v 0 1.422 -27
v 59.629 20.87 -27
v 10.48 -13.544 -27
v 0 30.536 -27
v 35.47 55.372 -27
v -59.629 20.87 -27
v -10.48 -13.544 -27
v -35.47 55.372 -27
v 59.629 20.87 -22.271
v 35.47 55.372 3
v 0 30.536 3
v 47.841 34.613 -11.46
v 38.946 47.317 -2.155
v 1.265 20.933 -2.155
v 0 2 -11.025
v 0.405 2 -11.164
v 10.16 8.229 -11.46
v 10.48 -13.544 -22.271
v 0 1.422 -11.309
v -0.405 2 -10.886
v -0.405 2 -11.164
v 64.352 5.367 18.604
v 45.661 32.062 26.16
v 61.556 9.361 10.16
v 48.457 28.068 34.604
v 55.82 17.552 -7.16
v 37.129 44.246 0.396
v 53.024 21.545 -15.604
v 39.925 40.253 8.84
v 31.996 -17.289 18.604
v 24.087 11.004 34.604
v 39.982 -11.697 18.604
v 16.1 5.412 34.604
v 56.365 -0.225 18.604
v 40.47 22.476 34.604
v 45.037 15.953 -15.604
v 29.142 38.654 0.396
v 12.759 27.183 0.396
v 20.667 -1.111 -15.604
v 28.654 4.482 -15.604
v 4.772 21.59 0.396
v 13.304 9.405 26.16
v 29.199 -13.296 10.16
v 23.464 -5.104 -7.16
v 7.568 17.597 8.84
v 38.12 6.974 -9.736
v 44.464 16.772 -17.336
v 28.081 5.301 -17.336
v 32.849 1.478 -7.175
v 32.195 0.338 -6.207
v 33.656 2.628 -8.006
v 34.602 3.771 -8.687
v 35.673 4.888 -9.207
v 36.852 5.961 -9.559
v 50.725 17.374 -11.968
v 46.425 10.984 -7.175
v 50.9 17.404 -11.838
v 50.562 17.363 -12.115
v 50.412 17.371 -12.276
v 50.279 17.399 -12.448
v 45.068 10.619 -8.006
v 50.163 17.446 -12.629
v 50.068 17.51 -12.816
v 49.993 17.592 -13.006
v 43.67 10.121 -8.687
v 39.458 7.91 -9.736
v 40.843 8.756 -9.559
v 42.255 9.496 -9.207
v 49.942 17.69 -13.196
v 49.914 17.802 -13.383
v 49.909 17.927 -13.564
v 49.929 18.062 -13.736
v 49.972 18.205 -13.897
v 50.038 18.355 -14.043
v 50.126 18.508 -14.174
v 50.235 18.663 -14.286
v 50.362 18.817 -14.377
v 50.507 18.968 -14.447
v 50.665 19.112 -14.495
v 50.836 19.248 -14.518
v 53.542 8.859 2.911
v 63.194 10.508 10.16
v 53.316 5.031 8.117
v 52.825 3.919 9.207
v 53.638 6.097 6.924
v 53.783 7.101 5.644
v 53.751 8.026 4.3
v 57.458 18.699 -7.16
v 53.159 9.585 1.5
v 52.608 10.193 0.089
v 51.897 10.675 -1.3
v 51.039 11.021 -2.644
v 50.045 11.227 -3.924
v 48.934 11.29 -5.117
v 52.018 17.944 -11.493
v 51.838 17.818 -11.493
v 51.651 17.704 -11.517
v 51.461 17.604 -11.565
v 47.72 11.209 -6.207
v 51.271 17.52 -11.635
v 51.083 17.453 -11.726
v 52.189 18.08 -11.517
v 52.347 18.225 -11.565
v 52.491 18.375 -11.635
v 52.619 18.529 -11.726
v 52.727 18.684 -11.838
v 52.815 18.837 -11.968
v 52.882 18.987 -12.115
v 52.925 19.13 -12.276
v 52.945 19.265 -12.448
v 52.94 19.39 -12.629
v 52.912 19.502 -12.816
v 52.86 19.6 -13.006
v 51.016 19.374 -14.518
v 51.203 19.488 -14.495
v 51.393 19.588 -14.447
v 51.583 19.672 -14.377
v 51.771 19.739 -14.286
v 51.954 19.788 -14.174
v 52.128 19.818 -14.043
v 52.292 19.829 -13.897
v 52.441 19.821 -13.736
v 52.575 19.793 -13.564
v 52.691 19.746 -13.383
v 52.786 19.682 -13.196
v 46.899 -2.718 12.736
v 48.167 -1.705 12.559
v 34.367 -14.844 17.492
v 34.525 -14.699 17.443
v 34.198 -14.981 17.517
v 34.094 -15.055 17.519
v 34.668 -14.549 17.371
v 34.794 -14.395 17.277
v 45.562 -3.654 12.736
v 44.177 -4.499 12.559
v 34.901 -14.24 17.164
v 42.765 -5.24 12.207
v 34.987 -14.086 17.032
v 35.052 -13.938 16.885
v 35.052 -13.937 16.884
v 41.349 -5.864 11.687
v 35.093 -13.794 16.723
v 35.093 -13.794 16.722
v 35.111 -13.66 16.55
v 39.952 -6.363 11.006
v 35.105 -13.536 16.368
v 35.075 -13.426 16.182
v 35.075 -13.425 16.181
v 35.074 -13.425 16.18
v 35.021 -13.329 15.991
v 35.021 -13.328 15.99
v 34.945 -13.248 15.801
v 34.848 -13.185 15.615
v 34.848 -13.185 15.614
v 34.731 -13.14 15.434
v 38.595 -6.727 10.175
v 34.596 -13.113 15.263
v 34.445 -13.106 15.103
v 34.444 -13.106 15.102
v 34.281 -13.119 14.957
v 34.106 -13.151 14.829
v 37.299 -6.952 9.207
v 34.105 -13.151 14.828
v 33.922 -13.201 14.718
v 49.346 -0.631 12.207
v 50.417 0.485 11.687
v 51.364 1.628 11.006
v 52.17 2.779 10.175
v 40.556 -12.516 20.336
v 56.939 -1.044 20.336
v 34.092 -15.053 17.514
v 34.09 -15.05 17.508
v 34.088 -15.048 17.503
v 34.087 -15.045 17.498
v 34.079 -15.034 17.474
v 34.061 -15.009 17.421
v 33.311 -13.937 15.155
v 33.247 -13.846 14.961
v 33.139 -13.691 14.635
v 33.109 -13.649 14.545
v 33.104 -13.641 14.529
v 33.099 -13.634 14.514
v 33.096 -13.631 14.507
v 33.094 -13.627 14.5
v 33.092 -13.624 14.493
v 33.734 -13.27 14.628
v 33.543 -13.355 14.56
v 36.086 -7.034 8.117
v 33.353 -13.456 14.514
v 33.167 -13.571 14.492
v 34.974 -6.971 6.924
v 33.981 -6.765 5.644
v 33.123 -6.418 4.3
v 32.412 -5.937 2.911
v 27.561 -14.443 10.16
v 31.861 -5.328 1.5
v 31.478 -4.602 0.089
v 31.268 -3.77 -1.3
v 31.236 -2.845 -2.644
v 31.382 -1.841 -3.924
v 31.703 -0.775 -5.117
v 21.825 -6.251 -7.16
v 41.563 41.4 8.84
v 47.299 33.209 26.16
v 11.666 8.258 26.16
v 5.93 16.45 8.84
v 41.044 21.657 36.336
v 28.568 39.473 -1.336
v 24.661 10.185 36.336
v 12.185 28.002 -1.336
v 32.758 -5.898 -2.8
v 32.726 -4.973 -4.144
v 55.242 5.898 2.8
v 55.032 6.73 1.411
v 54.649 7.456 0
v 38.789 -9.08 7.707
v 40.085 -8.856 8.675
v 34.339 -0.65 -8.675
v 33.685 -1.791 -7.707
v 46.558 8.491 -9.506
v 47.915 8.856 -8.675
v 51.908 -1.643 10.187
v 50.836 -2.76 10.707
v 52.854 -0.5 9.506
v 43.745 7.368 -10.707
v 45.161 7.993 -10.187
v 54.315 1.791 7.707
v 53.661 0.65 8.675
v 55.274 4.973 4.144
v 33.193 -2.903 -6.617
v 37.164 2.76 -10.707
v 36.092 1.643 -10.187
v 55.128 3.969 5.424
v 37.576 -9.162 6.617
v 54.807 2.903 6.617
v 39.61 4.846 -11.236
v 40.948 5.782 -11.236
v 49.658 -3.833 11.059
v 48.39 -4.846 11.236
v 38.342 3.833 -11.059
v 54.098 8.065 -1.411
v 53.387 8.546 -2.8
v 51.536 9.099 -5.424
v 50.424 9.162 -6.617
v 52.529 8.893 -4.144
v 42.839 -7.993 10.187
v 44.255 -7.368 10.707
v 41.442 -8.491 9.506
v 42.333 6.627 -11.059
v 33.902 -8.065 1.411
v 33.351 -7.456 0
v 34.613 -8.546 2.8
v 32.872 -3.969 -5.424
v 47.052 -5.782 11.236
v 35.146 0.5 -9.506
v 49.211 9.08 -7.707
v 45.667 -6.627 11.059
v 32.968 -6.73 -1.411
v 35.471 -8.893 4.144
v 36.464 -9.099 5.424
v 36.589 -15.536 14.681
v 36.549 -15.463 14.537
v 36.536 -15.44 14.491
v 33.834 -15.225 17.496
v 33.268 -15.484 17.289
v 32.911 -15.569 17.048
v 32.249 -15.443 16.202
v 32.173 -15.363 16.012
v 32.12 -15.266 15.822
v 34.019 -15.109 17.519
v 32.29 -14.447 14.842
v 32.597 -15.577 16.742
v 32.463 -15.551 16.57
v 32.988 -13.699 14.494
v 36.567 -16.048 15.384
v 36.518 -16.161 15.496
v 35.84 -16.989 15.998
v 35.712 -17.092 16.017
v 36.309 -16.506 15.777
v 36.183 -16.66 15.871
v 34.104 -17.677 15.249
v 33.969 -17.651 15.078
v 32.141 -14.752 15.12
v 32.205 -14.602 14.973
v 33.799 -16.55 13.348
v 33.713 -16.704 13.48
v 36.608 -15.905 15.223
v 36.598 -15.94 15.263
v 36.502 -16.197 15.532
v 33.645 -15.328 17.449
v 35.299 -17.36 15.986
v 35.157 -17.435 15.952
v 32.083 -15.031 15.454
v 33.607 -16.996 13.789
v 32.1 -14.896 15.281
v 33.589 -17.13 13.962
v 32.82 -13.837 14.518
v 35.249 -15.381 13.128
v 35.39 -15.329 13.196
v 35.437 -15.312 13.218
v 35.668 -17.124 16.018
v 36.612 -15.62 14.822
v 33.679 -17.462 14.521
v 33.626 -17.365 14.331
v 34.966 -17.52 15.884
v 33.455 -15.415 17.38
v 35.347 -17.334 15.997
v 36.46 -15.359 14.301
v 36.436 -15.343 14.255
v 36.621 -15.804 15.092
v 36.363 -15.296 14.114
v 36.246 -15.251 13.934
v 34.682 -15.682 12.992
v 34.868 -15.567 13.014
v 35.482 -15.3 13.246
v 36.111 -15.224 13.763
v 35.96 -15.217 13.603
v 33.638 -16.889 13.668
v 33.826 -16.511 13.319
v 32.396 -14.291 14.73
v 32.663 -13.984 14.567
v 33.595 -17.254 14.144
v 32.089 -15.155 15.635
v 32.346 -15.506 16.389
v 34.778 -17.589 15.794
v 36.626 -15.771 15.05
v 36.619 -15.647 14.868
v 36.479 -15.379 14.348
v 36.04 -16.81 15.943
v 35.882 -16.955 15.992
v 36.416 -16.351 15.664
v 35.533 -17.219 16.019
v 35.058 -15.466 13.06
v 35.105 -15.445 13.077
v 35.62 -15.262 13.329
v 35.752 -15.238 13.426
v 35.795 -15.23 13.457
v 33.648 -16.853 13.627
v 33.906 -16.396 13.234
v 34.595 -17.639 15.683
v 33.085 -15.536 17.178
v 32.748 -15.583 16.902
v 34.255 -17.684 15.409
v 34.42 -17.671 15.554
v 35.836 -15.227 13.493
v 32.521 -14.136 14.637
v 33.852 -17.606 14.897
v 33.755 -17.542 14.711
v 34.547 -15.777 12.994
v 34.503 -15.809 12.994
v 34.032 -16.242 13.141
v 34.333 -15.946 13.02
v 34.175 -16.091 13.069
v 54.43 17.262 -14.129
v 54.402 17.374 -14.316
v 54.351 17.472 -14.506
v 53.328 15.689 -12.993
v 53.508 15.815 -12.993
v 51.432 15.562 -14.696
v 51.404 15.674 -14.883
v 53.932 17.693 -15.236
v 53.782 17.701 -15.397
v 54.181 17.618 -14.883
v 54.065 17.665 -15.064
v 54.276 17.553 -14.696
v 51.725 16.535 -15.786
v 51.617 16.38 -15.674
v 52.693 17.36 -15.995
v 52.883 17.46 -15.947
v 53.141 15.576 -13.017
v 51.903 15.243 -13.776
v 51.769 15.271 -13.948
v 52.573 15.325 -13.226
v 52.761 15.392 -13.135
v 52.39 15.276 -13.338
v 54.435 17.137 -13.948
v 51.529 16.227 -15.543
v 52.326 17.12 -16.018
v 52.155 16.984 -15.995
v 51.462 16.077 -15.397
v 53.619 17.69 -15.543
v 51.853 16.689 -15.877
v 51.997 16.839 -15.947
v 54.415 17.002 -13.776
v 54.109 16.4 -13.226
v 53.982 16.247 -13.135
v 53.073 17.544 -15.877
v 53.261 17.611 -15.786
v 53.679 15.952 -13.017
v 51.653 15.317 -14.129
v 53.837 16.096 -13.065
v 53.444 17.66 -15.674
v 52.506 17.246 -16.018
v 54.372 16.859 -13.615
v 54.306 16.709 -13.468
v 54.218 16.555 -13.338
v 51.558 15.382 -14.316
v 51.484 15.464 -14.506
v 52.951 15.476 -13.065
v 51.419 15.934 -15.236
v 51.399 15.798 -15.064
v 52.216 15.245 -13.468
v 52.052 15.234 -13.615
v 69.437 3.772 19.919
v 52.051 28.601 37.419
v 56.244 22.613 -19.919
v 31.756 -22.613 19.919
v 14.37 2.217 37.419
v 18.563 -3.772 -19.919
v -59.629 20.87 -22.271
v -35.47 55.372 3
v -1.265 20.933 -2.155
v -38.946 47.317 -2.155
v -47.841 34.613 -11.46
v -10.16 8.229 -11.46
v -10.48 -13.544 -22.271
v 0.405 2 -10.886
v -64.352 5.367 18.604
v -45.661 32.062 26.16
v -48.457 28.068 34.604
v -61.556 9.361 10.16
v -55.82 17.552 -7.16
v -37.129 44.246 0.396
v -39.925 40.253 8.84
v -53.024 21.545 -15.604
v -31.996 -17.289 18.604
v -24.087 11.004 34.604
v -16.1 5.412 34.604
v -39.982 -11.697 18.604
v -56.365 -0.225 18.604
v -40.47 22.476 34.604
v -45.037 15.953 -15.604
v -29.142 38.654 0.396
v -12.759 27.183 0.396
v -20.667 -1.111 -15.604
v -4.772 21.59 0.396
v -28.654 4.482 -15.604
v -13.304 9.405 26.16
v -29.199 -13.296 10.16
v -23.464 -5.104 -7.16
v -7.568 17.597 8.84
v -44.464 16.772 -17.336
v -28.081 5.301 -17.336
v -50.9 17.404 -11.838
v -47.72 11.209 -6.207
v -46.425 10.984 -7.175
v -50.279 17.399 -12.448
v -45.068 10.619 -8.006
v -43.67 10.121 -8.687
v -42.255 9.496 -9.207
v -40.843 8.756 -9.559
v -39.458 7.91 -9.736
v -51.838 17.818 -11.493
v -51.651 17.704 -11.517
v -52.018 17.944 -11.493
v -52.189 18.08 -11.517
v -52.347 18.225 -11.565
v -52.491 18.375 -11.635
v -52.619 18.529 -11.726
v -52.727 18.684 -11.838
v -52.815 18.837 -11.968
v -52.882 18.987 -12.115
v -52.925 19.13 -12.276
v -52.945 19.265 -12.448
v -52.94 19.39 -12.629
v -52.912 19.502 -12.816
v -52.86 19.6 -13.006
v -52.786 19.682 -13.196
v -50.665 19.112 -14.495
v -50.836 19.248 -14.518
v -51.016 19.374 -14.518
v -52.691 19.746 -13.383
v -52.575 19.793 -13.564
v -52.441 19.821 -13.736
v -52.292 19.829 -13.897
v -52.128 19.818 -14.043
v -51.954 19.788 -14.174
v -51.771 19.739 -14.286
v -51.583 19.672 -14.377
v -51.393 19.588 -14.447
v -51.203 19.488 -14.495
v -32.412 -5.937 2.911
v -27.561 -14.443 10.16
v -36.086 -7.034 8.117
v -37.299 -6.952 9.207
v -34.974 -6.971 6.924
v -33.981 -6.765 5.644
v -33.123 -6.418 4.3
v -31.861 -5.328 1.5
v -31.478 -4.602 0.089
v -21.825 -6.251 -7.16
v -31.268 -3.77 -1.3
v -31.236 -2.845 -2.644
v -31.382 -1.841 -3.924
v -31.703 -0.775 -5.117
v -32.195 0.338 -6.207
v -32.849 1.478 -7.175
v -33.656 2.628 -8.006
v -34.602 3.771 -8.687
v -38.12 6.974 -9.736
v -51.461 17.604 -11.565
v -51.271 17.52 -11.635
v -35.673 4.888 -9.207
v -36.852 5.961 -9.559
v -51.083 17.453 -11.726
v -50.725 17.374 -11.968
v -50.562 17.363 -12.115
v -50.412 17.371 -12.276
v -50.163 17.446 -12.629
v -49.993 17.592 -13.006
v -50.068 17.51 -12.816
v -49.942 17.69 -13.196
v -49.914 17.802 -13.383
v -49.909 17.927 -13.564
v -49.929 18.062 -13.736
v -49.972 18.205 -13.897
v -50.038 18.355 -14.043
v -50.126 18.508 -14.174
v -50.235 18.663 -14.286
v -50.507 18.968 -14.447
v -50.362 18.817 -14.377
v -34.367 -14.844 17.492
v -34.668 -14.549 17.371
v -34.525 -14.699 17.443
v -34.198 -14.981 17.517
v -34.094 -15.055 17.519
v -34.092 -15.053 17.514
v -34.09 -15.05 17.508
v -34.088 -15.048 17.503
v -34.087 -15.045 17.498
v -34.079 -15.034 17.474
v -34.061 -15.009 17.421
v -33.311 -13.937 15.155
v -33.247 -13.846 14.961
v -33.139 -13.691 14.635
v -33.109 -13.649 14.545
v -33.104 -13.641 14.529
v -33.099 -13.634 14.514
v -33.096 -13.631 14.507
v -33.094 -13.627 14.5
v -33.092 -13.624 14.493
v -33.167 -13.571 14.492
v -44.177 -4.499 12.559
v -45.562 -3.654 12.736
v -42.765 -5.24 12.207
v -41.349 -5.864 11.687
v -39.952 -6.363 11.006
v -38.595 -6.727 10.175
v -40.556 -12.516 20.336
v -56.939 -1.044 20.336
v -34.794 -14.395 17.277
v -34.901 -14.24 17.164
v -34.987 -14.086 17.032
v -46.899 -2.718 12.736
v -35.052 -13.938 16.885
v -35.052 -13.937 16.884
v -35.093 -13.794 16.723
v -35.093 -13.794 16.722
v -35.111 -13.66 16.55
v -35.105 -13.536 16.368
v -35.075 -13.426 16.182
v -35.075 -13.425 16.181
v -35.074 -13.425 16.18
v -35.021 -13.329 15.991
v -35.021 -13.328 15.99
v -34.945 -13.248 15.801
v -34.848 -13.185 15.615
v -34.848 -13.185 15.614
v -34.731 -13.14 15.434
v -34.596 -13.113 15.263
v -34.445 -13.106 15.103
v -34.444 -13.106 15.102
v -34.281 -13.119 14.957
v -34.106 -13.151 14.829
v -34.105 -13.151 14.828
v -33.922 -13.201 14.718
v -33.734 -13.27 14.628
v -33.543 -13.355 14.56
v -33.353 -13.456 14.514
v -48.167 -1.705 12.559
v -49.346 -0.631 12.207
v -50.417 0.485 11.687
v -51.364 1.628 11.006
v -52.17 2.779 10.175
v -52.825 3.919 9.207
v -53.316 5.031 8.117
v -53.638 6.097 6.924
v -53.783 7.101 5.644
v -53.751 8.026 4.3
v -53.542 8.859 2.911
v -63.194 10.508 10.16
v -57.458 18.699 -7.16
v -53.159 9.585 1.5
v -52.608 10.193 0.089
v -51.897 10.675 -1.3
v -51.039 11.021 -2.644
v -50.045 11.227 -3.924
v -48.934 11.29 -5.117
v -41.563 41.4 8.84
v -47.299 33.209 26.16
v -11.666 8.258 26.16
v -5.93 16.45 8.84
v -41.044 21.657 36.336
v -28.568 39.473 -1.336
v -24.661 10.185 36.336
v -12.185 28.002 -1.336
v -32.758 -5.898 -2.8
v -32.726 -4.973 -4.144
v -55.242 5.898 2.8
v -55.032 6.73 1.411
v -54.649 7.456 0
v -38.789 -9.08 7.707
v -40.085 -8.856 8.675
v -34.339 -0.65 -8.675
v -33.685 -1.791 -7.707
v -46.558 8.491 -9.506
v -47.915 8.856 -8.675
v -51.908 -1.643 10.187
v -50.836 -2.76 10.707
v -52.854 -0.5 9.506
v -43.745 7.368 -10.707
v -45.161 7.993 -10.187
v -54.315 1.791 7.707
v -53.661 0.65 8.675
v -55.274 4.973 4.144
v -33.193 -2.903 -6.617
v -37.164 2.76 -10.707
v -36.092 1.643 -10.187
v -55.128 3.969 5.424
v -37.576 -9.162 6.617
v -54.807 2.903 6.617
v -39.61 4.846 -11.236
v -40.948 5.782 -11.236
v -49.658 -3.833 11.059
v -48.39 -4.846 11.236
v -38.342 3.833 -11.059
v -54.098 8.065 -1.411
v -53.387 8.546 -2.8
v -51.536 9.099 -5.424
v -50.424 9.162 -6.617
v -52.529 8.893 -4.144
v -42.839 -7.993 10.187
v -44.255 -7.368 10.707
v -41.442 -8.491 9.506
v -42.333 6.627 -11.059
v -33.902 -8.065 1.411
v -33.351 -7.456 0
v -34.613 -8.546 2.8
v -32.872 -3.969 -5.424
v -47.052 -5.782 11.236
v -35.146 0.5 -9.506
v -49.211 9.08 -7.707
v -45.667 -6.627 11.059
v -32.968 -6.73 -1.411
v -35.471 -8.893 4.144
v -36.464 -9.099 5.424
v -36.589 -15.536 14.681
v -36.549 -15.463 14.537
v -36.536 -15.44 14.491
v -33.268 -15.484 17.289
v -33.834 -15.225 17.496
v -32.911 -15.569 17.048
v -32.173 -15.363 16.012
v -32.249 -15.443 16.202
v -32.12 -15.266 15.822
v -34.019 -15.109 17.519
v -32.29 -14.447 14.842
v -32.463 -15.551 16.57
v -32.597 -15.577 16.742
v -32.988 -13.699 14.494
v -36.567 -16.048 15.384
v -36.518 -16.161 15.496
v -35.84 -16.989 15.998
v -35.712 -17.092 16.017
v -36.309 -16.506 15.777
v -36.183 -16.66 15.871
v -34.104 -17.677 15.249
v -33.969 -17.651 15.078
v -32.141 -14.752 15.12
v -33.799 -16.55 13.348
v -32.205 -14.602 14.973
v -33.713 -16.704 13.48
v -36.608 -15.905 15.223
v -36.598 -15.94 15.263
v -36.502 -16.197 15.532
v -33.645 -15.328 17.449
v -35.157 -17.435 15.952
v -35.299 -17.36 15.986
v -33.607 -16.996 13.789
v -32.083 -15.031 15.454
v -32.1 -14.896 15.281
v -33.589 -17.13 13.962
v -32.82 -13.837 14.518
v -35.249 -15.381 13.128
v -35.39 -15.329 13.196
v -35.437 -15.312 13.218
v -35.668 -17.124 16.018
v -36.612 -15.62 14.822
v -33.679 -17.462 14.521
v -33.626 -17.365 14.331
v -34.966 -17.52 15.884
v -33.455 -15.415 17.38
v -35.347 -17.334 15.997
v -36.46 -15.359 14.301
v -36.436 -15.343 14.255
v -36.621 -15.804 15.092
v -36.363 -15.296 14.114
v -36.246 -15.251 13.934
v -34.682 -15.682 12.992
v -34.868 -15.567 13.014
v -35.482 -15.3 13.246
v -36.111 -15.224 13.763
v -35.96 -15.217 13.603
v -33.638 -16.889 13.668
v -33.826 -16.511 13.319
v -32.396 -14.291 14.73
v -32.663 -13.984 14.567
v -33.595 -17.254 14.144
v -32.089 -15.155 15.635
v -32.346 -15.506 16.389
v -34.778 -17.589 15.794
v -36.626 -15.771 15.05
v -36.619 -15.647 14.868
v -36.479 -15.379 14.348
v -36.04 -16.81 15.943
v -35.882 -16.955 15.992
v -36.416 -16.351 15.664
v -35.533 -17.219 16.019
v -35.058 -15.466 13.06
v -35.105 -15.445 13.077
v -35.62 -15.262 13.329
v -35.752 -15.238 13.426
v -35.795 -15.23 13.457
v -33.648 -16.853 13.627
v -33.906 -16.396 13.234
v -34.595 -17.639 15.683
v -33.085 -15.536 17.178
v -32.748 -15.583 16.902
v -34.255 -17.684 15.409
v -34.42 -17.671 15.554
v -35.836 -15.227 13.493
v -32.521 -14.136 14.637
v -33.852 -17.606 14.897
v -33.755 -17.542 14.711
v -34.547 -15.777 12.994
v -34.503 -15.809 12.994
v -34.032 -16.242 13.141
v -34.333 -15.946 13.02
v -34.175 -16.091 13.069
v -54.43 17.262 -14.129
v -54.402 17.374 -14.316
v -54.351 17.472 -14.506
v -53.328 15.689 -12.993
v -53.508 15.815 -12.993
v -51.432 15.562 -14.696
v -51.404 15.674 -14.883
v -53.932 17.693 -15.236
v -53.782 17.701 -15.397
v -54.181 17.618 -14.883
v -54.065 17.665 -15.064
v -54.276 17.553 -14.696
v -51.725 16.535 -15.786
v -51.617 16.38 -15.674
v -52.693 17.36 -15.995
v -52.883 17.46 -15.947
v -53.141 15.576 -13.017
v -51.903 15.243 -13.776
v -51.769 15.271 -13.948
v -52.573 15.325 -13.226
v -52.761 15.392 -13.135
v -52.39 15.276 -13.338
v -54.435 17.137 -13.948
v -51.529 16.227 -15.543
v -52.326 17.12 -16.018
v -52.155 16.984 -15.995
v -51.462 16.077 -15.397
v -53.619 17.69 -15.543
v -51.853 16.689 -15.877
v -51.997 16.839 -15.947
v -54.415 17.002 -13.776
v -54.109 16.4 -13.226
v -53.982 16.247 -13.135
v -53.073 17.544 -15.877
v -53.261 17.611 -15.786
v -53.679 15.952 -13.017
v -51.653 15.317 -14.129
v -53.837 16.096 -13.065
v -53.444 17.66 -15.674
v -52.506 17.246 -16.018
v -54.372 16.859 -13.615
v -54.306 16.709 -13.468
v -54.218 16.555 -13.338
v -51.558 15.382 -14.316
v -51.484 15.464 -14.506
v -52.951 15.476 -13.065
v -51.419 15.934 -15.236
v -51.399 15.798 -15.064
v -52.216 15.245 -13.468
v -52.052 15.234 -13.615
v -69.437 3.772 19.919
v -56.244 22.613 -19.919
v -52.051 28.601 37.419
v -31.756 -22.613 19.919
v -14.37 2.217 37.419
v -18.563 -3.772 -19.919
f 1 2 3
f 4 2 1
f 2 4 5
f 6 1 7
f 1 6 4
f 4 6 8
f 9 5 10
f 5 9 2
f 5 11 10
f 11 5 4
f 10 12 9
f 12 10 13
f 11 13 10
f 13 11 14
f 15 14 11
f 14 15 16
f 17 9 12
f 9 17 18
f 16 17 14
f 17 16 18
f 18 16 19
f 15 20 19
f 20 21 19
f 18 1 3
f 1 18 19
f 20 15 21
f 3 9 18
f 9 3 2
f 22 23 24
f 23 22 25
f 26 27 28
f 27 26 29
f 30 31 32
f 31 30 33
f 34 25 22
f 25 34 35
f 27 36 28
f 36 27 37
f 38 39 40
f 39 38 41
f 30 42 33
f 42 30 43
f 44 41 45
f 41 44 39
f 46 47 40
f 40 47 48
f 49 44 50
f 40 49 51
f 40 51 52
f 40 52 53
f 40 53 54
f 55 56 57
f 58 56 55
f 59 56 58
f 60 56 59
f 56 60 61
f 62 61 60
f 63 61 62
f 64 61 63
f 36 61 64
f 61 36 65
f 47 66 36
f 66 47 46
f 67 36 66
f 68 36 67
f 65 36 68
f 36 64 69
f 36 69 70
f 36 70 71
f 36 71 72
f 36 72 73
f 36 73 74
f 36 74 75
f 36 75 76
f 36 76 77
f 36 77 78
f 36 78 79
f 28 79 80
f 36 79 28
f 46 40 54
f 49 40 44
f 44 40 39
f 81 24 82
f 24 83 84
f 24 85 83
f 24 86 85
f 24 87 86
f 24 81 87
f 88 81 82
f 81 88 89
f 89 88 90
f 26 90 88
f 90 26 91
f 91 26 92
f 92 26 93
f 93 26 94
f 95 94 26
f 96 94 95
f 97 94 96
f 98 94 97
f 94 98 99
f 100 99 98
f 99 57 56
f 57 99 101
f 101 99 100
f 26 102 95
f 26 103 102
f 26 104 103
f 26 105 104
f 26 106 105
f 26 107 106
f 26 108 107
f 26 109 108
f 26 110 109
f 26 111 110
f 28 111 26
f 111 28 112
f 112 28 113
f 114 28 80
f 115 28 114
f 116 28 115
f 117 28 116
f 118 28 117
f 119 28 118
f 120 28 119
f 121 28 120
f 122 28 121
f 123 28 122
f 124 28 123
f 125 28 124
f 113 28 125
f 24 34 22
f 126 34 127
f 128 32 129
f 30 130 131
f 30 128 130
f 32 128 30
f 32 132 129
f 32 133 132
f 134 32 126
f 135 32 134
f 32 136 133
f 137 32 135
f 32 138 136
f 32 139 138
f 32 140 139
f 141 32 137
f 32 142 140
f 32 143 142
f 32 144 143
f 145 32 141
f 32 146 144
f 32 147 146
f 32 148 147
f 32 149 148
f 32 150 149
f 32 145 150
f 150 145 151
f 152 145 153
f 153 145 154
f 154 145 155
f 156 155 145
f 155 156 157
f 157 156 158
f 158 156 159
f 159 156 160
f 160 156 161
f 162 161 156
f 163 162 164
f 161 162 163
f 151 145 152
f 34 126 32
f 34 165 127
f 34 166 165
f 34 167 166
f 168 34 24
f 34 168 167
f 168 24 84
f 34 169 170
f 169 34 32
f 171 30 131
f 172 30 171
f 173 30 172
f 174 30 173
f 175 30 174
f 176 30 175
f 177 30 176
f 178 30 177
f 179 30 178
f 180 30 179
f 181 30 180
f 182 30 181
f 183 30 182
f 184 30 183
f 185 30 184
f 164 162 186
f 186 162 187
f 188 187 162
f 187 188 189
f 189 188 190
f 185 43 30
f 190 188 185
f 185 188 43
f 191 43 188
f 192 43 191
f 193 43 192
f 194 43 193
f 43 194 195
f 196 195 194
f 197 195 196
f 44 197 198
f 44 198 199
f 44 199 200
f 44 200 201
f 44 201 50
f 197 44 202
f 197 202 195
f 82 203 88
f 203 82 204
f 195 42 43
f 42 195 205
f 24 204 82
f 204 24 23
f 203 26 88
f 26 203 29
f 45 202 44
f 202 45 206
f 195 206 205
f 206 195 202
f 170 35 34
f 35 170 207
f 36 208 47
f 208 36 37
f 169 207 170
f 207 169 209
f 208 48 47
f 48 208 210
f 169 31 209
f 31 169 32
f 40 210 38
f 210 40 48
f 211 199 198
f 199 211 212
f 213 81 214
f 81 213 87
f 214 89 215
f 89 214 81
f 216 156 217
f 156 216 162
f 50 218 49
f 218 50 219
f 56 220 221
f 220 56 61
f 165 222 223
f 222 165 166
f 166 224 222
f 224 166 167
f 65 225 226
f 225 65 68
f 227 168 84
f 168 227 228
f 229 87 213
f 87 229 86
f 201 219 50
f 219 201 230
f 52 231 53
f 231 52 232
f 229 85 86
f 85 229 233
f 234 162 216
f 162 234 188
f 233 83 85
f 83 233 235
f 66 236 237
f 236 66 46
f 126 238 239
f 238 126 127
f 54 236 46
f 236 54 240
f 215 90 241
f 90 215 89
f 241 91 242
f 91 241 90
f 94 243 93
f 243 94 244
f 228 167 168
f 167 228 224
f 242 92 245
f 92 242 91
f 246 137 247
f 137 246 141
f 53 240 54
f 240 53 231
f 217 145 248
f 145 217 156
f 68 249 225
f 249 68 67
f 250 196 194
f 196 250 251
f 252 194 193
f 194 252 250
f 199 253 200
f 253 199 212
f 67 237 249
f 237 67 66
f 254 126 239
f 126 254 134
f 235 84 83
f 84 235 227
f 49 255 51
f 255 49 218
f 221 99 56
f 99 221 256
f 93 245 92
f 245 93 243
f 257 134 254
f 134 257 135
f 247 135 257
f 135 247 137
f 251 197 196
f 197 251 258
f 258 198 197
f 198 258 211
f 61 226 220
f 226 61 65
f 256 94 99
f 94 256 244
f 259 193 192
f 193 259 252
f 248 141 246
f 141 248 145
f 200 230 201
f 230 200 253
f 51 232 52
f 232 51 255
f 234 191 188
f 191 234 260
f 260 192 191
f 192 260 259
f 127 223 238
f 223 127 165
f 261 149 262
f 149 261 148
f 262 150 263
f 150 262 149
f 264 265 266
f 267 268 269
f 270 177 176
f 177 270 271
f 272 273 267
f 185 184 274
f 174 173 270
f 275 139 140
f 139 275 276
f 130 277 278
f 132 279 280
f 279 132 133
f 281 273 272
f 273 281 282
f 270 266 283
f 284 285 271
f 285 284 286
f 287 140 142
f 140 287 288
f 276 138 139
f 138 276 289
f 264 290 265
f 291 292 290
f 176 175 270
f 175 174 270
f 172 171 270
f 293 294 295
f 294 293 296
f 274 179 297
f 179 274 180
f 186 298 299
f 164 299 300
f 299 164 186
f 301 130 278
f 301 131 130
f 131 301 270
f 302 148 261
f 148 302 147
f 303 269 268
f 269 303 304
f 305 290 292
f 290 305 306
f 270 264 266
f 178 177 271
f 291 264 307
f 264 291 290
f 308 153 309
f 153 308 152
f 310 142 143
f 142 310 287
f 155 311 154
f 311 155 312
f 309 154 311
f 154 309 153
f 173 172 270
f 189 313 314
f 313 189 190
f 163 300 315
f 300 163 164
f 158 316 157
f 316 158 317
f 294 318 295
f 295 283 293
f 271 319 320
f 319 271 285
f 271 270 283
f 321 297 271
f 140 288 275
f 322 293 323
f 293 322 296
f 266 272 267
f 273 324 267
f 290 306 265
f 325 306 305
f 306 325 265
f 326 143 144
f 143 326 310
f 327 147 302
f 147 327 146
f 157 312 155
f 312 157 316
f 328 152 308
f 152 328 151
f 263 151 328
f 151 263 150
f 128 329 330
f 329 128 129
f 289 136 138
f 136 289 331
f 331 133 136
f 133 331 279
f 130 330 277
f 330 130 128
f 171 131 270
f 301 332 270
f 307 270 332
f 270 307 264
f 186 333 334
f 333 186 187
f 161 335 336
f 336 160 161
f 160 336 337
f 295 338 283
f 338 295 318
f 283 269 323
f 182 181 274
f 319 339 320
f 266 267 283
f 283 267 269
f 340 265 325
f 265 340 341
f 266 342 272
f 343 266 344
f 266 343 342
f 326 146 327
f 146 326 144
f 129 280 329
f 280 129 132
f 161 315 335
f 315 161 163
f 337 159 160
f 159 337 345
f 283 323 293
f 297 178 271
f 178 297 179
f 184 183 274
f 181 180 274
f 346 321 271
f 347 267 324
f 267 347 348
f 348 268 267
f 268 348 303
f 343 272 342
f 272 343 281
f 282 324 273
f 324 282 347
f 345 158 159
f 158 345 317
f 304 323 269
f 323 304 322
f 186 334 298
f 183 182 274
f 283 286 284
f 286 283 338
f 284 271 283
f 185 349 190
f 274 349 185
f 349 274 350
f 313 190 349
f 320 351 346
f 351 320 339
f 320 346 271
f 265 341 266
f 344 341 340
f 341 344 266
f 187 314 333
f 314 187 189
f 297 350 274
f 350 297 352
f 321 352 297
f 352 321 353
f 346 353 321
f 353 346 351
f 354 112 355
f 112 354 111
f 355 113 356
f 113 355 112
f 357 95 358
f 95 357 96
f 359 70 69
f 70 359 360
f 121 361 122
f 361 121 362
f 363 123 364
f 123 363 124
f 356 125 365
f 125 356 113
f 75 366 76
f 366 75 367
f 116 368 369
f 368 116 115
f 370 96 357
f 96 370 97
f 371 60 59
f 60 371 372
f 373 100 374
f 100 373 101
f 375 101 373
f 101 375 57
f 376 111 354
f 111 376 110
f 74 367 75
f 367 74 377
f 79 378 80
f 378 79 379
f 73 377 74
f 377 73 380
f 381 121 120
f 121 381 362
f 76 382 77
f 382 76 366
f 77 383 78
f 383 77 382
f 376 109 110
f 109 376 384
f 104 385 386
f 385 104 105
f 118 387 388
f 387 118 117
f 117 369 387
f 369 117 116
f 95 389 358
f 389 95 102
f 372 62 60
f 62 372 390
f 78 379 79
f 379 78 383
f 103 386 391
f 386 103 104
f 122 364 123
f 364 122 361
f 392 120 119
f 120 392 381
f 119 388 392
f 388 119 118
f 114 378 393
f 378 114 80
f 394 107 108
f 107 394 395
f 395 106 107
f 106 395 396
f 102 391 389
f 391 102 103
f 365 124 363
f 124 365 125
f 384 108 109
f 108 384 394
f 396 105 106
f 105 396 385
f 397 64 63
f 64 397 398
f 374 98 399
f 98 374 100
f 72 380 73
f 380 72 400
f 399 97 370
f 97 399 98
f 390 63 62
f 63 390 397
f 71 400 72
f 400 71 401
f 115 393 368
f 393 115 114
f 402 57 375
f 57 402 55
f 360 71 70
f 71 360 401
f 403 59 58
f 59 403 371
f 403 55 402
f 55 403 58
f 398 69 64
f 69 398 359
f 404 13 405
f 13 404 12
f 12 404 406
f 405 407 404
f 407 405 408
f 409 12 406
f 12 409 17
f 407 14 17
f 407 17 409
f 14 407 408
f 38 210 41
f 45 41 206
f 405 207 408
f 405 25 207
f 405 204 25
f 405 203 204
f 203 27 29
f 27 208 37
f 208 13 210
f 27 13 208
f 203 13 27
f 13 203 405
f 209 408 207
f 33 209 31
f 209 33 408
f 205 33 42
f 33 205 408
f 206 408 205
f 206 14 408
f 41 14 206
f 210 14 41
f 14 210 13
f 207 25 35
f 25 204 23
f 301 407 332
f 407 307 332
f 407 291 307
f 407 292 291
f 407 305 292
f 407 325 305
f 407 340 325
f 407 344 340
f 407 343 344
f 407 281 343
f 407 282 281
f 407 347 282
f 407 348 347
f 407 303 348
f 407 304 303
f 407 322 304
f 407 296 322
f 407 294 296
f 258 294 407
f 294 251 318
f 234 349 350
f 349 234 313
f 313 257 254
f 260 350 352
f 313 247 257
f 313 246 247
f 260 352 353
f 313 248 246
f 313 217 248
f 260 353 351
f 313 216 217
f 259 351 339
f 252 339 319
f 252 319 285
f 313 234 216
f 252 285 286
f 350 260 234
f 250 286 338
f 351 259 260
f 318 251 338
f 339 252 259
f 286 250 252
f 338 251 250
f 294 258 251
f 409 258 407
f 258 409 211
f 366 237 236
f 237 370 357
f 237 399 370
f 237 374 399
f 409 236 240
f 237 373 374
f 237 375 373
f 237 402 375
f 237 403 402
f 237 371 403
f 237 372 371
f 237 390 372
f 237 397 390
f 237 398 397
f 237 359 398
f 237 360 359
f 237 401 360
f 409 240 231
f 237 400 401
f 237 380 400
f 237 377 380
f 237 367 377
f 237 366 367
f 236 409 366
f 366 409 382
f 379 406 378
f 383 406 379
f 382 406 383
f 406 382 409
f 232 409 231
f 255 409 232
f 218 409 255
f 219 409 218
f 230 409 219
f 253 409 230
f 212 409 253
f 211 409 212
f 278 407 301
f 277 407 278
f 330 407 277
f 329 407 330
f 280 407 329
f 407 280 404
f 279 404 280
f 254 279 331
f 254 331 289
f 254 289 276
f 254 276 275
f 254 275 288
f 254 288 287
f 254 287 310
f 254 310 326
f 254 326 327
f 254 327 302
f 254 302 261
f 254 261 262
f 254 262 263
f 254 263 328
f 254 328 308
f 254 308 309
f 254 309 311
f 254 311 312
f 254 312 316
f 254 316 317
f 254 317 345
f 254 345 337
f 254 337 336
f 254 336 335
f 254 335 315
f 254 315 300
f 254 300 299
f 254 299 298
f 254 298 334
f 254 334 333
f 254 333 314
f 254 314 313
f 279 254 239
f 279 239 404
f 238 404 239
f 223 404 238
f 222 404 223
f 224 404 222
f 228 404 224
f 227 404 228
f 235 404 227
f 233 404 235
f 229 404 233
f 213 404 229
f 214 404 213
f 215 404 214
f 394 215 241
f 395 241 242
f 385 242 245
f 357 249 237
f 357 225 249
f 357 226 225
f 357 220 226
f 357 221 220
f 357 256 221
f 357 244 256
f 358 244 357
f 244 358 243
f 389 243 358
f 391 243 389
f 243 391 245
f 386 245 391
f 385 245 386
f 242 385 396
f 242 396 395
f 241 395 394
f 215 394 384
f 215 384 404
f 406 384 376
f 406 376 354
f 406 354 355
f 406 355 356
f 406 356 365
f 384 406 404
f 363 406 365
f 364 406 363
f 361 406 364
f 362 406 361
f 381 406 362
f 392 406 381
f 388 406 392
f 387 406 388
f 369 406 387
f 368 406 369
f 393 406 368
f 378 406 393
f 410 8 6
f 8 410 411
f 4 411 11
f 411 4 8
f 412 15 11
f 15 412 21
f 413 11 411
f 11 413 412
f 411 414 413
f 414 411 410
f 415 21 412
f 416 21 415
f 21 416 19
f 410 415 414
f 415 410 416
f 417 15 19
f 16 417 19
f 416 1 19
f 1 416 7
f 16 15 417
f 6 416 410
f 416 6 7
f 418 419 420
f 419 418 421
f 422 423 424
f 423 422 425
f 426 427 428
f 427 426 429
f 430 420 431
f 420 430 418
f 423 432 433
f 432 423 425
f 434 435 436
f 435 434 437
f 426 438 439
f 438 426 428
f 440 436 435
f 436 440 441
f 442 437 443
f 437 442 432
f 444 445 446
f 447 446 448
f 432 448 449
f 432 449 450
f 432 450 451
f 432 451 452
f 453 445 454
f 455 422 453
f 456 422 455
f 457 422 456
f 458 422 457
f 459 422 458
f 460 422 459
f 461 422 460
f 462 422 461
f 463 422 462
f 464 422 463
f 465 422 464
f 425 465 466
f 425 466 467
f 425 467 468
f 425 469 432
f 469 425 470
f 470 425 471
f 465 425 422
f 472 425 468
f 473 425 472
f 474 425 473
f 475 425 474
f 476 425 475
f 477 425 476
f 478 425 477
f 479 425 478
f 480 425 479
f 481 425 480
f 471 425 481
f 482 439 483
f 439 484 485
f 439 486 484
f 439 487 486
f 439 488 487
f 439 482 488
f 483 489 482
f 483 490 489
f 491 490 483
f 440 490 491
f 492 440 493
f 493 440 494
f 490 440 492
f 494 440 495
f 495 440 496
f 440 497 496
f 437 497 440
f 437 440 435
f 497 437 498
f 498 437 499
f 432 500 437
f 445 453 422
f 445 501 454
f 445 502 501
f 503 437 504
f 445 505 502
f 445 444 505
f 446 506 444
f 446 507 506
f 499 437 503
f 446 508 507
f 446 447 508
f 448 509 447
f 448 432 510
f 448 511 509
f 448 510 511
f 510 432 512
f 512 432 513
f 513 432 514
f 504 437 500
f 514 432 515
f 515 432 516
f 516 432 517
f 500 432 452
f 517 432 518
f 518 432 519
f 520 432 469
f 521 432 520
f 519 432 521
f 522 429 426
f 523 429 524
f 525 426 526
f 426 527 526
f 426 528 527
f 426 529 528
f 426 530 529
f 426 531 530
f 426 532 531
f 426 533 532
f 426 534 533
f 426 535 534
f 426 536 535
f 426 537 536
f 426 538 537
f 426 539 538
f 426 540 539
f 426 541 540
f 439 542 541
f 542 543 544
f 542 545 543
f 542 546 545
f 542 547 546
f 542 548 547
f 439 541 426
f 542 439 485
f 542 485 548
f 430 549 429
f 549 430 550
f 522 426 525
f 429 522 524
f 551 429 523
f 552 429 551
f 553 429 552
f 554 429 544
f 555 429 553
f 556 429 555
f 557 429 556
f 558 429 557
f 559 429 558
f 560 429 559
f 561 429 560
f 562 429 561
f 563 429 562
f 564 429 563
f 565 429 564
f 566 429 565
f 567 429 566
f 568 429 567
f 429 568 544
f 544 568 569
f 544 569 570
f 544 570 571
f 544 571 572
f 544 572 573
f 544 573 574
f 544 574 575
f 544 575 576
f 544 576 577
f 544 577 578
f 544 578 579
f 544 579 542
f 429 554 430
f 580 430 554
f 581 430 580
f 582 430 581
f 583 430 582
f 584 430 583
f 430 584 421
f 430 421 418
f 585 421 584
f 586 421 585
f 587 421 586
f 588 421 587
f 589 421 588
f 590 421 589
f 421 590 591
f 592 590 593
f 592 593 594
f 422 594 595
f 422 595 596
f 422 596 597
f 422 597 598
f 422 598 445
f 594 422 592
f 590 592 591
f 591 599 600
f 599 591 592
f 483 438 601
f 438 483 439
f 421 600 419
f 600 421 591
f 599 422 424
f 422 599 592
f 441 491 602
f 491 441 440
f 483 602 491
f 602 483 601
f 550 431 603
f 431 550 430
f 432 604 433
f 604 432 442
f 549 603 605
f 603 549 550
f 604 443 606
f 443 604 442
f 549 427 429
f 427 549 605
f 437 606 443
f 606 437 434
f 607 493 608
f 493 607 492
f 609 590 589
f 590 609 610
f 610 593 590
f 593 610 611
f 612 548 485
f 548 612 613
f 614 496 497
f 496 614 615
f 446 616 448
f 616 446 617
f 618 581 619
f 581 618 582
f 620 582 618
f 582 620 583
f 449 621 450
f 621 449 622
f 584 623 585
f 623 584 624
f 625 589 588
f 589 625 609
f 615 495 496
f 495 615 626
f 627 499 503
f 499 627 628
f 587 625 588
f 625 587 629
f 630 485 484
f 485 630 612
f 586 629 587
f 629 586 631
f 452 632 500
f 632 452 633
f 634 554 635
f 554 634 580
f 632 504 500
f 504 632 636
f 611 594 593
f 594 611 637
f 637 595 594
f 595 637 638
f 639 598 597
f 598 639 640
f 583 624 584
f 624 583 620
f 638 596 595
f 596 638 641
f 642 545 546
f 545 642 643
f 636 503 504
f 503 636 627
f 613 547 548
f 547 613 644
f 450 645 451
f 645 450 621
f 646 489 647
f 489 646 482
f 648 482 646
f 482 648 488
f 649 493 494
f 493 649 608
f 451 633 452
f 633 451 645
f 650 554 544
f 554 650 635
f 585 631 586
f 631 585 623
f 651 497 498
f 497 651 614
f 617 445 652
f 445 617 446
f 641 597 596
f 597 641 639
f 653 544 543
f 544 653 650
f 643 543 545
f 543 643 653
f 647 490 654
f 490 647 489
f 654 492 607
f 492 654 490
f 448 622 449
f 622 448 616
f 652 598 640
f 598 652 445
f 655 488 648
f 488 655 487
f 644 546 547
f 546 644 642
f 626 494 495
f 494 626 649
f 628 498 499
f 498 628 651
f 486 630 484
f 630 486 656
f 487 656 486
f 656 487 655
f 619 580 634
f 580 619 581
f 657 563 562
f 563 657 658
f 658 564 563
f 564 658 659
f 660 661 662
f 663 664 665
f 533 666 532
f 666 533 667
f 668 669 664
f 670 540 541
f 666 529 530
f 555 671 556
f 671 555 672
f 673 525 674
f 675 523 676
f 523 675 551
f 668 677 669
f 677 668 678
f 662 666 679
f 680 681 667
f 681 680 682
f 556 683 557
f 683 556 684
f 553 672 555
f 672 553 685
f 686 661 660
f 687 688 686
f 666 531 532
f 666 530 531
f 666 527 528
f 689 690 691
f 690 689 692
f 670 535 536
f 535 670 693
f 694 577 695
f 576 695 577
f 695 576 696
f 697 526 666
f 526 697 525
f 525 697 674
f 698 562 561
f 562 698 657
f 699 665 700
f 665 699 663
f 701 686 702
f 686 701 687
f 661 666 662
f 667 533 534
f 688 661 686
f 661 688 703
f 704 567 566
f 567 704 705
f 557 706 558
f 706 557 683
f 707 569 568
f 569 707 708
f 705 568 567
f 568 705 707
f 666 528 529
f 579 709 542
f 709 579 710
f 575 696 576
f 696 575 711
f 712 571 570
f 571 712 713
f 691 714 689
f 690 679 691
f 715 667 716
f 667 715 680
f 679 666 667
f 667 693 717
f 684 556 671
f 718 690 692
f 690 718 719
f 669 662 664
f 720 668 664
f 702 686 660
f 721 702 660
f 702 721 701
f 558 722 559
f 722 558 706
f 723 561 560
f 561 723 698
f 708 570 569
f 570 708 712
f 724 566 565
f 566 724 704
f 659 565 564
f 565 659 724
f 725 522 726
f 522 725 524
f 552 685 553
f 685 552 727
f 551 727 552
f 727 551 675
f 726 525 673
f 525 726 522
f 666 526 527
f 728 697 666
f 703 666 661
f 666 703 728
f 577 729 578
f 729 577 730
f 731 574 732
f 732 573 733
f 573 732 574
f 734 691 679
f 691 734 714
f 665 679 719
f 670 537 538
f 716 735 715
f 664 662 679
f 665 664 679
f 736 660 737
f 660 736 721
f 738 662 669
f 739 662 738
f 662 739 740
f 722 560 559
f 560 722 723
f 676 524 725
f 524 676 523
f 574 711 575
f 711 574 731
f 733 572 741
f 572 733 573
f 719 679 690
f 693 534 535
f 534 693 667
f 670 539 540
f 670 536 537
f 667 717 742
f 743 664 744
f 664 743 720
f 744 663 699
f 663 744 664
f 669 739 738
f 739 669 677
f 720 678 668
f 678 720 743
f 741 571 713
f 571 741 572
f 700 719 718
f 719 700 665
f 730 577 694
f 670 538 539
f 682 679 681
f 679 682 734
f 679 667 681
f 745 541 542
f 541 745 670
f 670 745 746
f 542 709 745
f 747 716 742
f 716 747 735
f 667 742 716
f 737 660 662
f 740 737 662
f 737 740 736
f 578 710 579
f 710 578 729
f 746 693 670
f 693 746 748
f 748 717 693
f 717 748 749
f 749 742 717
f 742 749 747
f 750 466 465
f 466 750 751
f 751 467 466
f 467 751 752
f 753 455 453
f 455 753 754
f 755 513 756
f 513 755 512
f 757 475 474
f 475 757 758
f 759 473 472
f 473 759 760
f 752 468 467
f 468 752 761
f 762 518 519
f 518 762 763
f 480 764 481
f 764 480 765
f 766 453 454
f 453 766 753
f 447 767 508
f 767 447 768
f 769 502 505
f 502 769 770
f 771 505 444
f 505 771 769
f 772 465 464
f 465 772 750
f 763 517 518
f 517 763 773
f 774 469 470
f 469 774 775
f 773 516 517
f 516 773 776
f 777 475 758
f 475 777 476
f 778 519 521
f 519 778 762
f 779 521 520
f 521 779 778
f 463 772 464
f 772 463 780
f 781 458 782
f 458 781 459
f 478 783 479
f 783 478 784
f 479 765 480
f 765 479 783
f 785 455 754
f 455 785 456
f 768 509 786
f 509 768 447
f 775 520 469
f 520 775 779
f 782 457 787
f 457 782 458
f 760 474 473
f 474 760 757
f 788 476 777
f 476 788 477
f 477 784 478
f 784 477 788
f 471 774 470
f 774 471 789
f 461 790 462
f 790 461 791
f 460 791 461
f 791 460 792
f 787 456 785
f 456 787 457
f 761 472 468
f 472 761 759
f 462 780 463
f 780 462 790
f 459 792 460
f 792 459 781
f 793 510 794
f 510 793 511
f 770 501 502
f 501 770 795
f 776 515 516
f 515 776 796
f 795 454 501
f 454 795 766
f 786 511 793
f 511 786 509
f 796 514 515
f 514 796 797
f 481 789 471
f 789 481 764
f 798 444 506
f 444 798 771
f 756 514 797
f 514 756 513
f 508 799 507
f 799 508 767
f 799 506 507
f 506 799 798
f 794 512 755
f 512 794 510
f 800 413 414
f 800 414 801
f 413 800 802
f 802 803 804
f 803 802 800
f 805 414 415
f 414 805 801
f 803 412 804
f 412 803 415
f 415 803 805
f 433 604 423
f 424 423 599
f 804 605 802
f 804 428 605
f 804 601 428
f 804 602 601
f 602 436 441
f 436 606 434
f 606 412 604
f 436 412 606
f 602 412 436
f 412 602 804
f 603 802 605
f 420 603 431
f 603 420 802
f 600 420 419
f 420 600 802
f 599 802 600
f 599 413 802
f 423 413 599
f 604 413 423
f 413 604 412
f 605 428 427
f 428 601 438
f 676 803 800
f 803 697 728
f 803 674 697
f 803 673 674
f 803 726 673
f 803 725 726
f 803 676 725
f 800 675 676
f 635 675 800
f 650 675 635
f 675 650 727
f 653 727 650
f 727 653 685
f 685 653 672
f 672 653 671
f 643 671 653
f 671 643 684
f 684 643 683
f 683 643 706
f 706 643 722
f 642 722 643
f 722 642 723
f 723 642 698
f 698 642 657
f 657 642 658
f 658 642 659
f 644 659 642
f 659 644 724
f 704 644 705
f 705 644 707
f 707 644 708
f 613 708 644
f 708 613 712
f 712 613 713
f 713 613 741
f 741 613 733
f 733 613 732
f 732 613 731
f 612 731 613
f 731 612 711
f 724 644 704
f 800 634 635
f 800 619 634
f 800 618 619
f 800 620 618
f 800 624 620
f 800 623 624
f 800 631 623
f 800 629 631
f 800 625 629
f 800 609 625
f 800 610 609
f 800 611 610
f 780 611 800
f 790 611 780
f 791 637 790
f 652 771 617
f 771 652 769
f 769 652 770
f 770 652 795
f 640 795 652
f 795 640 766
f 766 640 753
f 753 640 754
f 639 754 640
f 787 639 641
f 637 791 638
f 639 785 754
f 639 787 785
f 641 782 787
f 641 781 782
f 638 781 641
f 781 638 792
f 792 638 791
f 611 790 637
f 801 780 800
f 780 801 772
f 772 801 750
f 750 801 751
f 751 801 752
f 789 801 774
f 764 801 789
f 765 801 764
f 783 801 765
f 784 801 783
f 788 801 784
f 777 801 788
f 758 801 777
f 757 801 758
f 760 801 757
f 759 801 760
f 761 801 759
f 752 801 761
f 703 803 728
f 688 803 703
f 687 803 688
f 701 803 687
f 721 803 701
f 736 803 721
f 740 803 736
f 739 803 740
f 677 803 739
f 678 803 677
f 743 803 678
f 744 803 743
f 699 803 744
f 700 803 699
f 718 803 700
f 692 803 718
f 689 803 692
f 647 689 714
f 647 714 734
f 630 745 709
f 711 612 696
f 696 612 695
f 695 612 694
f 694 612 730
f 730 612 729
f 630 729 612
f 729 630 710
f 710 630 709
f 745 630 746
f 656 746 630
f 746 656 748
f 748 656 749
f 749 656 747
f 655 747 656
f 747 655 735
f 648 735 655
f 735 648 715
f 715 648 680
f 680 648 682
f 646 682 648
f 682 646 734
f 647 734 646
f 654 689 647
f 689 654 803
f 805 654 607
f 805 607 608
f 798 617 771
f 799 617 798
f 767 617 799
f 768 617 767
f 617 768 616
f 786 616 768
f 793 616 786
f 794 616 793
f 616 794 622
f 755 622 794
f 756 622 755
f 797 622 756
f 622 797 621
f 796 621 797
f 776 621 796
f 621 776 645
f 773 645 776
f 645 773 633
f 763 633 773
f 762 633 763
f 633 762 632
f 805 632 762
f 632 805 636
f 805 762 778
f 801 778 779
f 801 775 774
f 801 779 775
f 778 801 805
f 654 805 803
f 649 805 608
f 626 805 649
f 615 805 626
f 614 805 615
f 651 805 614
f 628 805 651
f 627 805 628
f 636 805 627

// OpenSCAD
resolution_factor = 1.00;

module prism(l, w, h)
{
    polyhedron(
               points=[[0,0,0], [l,0,0], [l,w,0], [0,w,0], [0,w,h], [l,w,h]],
               faces=[[0,1,2,3],[5,4,3,2],[0,4,5,1],[0,3,4],[5,2,1]]
               );    
}

module camera_cutout()
{
    width = 39.5;
    height = 39.5;
    length = 68;
    cable_well_depth = 4.0;
    cable_well_width= 20.0;
    
    //How much do we pull back 
    translate([0, 3, 0])
    
    union()
    {
        //Basic block of electronics
        translate([0, length/2, 0])
        cube([width, length, height], center = true);
        
        //Channel for cables between electronics
        translate([0, length/2.0, 0])
        cube([width+cable_well_depth, length, cable_well_width], center = true);
        translate([0, length/2.0, 0])
        cube([cable_well_width, length, height+cable_well_depth], center = true);
        
        //Lens hole
        translate([0, 0.01, 0])
        rotate(90, [1, 0, 0])
        cylinder(r = 13, h = 20, $fn = 50);
        
        //Screwholes
        zz = 33.5/2;
//        translate([zz, 0.01, zz])
//        rotate(90, [1, 0, 0])
//        cylinder(r = 3.5/2, h = 4, $fn = 50);
        translate([-zz, 0, zz])
        rotate(90, [1, 0.01, 0])
        cylinder(r = 3.5/2, h = 4, $fn = 50);
        translate([zz, 0.01, -zz])
        rotate(90, [1, 0, 0])
        cylinder(r = 3.5/2, h = 4, $fn = 50);
//       translate([-zz, 0.01, -zz])
//       rotate(90, [1, 0, 0])
//       cylinder(r = 3.5/2, h = 4, $fn = 50);
        
    }
}

module camera()
{
    width = 46;
    depth = 35.0;
    difference()
    {
        union()
        {
            translate([0, depth/2, 0])
            cube([width, depth, width], center = true);
        }
        camera_cutout();
    }
}


/*

color( "LightCoral", 1.0 ) {
    translate([-distV,0,0])
    rotate([dispV,0,-dispH])
    camera();
}
*/

//SUPPORT PRISMS


//DRAWING THE CAMERA BOXES
dispH = 35;
dispV = 30;
distV = 44;

$fn=100;


module sup(){

    difference(){
        difference(){
            color( "PaleGreen", 1.0 ) {
                translate([15, -20, -27])
                rotate([0,0,dispH])
                    prism(60, 50, 30);
            }   
            translate([-35, 2, -40])
            cube(size = [35, 30, 55], center = false);
        }

        translate([25, -40, -30])
        rotate([0,0,dispH])
        cube(size = [80, 30, 15], center = false);
        }


     color( "MediumPurple", 1.0 ) {
         translate([distV,0,0])
         rotate([dispV,0,dispH])
         camera();
     }
}

sup();

mirror([1,0,0]) sup();


/*
color( "White", 1.0 ) {
    translate([-35, 2, -40])
    cube(size = [35, 30, 55], center = false);
}

difference(){
    color( "LightBlue", 1.0 ) {
        translate([-65, 15, -27])
        rotate([0,0,-dispH])
            prism(60,50,30);
    }   
    translate([0.5, 2, -40])
    cube(size = [35, 30, 55], center = false);

}

*/
